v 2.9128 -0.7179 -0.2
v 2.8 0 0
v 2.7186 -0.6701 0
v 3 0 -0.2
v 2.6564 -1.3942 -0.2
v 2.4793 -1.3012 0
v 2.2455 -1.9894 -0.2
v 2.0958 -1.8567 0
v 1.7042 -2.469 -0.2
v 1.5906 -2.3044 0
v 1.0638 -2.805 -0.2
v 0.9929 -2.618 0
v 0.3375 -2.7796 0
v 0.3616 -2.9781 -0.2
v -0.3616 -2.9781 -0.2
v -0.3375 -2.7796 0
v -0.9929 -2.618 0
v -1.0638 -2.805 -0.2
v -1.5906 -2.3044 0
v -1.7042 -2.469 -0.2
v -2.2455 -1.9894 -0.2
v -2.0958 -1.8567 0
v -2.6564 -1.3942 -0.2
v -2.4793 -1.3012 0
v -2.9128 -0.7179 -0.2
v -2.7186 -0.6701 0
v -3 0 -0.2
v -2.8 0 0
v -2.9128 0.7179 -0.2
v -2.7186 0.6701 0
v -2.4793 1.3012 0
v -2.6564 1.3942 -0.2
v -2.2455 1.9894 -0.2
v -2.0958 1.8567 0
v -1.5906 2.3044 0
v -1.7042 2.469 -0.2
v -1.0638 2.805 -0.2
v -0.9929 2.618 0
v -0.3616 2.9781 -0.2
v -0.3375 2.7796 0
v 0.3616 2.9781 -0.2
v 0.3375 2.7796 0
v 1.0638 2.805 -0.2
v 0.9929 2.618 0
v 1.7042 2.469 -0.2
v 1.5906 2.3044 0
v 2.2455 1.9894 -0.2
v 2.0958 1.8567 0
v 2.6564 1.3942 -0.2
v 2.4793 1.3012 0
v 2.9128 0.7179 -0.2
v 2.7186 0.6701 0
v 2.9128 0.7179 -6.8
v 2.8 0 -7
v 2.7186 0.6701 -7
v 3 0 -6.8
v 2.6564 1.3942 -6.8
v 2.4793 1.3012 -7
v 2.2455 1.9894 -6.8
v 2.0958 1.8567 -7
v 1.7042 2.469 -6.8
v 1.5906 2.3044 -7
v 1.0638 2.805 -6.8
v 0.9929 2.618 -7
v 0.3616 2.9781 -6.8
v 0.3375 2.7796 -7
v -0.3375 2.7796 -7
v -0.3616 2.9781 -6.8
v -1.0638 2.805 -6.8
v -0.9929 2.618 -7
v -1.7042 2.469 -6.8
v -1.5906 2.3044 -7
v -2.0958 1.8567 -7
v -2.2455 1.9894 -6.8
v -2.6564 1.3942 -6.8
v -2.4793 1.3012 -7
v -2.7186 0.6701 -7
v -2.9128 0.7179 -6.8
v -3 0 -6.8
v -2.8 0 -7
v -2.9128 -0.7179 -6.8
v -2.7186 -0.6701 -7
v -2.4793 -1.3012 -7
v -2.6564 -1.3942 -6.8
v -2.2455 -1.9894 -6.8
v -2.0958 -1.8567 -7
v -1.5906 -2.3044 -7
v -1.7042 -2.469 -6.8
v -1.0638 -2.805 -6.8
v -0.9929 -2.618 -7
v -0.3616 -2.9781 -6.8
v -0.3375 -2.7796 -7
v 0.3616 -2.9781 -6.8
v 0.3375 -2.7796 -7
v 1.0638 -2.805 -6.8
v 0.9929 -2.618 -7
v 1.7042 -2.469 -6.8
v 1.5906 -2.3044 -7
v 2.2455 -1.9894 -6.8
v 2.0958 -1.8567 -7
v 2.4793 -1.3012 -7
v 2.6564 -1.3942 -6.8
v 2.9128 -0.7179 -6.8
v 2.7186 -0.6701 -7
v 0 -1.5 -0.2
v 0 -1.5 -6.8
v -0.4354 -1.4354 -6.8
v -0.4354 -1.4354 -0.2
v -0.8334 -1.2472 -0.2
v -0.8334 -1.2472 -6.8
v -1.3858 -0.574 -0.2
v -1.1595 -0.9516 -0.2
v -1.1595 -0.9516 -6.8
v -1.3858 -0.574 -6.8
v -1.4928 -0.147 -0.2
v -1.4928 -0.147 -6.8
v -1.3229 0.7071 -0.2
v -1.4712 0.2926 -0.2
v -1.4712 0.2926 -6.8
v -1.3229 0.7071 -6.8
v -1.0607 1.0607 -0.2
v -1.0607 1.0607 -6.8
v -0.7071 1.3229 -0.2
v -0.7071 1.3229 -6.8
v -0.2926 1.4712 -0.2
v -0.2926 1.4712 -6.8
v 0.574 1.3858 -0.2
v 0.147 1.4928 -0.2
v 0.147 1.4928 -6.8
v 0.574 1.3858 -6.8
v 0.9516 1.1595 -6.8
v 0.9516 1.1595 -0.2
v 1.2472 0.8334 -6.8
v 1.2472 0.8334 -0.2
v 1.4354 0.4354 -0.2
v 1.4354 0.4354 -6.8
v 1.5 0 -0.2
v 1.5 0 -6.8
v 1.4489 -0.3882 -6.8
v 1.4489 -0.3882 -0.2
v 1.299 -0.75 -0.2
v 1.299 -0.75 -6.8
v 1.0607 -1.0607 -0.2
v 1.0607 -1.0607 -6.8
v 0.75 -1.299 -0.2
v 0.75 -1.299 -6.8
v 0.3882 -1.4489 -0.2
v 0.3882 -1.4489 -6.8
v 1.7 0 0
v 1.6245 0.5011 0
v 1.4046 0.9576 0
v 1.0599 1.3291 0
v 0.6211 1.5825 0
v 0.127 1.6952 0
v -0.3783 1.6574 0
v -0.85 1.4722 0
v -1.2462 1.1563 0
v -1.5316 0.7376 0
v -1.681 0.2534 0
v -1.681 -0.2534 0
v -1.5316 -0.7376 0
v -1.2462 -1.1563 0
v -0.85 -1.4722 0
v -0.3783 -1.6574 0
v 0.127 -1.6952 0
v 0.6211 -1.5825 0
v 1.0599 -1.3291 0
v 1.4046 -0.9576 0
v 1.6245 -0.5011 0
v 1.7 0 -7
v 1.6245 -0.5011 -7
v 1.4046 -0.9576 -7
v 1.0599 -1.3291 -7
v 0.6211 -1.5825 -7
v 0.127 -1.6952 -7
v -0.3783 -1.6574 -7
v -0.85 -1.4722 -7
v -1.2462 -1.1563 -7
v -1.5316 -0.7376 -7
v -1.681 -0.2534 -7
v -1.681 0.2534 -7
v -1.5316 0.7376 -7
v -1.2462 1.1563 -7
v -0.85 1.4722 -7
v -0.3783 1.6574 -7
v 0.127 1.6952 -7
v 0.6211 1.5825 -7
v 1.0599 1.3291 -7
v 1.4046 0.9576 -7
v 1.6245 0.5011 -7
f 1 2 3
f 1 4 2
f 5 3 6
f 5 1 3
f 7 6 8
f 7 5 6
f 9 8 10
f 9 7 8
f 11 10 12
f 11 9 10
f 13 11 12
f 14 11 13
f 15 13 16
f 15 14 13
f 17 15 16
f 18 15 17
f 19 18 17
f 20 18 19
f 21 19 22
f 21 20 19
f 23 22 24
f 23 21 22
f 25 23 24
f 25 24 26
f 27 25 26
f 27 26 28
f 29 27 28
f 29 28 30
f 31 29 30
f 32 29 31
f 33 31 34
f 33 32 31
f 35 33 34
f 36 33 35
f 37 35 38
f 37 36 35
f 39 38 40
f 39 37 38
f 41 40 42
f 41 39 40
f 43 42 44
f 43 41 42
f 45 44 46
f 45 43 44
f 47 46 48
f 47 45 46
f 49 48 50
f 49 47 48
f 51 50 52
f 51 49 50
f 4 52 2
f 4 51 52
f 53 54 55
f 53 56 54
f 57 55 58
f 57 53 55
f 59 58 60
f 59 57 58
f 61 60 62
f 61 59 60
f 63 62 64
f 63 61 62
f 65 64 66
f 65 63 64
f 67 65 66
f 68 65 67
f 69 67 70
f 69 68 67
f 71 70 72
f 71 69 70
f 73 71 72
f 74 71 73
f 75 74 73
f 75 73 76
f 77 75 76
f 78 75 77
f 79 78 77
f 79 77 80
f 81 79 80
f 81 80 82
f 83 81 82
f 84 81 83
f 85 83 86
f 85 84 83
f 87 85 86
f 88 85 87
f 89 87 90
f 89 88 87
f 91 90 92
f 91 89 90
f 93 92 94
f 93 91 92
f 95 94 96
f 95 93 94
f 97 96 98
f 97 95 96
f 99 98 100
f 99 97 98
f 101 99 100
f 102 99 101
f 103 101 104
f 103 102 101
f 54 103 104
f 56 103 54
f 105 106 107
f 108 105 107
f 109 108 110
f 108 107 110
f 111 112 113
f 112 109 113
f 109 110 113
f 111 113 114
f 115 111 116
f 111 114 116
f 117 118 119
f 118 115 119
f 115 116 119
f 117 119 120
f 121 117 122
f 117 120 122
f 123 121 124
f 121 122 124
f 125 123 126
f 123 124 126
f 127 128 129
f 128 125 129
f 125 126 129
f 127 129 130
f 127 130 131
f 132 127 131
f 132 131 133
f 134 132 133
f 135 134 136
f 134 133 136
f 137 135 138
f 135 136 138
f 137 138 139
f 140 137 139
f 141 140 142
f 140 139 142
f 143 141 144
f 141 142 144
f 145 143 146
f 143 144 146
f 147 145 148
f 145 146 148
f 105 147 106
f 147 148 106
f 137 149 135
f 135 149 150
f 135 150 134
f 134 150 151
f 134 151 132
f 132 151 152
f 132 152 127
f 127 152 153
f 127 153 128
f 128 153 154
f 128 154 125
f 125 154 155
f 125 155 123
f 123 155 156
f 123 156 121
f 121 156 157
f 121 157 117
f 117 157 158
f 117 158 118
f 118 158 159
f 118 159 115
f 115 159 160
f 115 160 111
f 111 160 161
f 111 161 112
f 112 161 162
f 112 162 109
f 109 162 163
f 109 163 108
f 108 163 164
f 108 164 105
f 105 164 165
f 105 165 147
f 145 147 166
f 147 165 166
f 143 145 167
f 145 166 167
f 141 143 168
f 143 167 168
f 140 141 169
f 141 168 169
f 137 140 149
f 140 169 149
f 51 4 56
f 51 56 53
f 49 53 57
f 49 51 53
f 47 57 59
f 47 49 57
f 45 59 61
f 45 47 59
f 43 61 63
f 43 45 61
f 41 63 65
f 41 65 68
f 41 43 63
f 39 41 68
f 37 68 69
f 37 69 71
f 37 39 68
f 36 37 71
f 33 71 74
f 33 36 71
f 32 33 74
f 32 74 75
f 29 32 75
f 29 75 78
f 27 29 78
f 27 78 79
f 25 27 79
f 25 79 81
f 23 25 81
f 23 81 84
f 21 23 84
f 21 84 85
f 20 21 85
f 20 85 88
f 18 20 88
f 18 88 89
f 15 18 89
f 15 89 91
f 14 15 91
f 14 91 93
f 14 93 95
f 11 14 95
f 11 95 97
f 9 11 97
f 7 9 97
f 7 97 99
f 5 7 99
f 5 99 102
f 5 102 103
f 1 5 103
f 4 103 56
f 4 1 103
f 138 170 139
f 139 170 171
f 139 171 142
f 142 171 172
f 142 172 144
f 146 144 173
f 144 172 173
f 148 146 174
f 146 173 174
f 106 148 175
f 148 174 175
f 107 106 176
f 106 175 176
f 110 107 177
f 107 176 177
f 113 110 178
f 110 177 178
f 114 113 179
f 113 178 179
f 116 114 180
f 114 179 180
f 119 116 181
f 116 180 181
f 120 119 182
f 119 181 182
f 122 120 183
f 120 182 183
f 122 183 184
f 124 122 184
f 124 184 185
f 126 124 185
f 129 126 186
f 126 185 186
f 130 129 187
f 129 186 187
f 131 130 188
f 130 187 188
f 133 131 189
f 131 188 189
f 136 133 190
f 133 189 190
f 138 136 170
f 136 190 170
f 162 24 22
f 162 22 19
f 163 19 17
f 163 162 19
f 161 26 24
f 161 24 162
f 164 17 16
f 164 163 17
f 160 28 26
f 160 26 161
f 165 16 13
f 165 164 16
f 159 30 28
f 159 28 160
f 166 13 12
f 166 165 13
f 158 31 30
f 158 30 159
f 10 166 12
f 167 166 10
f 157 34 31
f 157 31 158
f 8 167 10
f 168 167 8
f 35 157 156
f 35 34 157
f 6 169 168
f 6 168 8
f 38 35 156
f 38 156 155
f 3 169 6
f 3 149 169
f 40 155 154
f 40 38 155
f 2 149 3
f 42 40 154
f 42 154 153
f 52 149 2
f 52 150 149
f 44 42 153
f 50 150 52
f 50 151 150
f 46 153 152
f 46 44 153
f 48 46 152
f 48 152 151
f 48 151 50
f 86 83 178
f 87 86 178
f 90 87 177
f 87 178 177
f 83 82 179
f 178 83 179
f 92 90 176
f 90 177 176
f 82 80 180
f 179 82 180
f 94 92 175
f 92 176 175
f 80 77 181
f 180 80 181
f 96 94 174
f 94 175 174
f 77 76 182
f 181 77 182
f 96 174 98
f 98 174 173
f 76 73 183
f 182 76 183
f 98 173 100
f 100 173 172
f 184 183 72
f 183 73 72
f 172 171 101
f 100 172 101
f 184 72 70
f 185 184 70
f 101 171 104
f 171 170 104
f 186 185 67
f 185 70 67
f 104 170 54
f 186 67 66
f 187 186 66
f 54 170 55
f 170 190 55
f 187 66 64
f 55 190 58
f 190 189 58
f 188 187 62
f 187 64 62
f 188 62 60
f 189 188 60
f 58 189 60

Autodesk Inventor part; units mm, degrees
sketch "_____1" plane through (0, 0, 0) normal (0, 1, 0) x (1, 0, 0)
  line L0 (0, 0) -> (0, 7)
  line L1 (0, 7) -> (3, 7)
  line L2 (3, 7) -> (3, 0)
  line L3 (3, 0) -> (0, 0)
  line L4 (0, 0) -> (0, 7)
revolve "Revolution1" add sketch "_____1" angle 360 about axis through (0, 0, 0) along (0, 0, 1)
sketch "_____2" plane through (0, 0, 0) normal (0, 1, 0) x (1, 0, 0)
  line L0 (0, 0) -> (0, 7)
  line L1 (2.8, 7) -> (3, 6.8)
  line L2 (3, 6.8) -> (3, 7)
  line L3 (3, 7) -> (2.8, 7)
revolve "Revolution2" cut sketch "_____2" angle 360 about axis through (0, 0, 0) along (0, 0, 1)
sketch "_____3" plane through (0, 0, 0) normal (0, 1, 0) x (1, 0, 0)
  line L0 (0, 0) -> (0, 7)
  line L1 (2.8, 0) -> (3, 0)
  line L2 (3, 0) -> (3, 0.2)
  line L3 (3, 0.2) -> (2.8, 0)
revolve "Revolution3" cut sketch "_____3" angle 360 about axis through (0, 0, 0) along (0, 0, 1)
sketch "Sketch4" plane through (0, 0, 0) normal (0, 0, 1) x (1, 0, 0)
  point P0 (0, 0)
hole "Hole1" at (0, 0, 0) direction (0, 0, -1) diameter 3 depth 7
sketch "_____5" plane through (0, 0, 0) normal (0, 1, 0) x (1, 0, 0)
  line L0 (0, -14) -> (0, 14)
  line L1 (1.5, 6.8) -> (1.7, 7)
  line L2 (1.7, 7) -> (1.5, 7)
  line L3 (1.5, 7) -> (1.5, 6.8)
revolve "Revolution4" cut sketch "_____5" angle 360 about axis through (0, 0, 14) along (0, 0, 1)
sketch "_____6" plane through (0, 0, 0) normal (0, 1, 0) x (1, 0, 0)
  line L0 (0, -14) -> (0, 14)
  line L1 (1.5, 0.2) -> (1.5, 0)
  line L2 (1.5, 0) -> (1.7, 0)
  line L3 (1.7, 0) -> (1.5, 0.2)
revolve "Revolution5" cut sketch "_____6" angle 360 about axis through (0, 0, 14) along (0, 0, 1)
ref_plane "spring_XY" through (0, 0, 0) normal (0, 0, 1) x (1, 0, 0)
ref_plane "spring_YZ" through (0, 0, 0) normal (1, 0, 0) x (0, 1, 0)
ref_plane "spring_ZX" through (0, 0, 0) normal (0, 1, 0) x (0, 0, 1)
ref_plane "to_bolt_XY" through (0, 0, -7) normal (0, 0, 1) x (1, 0, 0)
ref_plane "to_bolt_YZ" through (0, 0, -7) normal (1, 0, 0) x (0, 1, 0)
ref_plane "to_bolt_ZX" through (0, 0, -7) normal (0, 1, 0) x (0, 0, 1)
properties part number "FWSSA-D6-V3-T7"
